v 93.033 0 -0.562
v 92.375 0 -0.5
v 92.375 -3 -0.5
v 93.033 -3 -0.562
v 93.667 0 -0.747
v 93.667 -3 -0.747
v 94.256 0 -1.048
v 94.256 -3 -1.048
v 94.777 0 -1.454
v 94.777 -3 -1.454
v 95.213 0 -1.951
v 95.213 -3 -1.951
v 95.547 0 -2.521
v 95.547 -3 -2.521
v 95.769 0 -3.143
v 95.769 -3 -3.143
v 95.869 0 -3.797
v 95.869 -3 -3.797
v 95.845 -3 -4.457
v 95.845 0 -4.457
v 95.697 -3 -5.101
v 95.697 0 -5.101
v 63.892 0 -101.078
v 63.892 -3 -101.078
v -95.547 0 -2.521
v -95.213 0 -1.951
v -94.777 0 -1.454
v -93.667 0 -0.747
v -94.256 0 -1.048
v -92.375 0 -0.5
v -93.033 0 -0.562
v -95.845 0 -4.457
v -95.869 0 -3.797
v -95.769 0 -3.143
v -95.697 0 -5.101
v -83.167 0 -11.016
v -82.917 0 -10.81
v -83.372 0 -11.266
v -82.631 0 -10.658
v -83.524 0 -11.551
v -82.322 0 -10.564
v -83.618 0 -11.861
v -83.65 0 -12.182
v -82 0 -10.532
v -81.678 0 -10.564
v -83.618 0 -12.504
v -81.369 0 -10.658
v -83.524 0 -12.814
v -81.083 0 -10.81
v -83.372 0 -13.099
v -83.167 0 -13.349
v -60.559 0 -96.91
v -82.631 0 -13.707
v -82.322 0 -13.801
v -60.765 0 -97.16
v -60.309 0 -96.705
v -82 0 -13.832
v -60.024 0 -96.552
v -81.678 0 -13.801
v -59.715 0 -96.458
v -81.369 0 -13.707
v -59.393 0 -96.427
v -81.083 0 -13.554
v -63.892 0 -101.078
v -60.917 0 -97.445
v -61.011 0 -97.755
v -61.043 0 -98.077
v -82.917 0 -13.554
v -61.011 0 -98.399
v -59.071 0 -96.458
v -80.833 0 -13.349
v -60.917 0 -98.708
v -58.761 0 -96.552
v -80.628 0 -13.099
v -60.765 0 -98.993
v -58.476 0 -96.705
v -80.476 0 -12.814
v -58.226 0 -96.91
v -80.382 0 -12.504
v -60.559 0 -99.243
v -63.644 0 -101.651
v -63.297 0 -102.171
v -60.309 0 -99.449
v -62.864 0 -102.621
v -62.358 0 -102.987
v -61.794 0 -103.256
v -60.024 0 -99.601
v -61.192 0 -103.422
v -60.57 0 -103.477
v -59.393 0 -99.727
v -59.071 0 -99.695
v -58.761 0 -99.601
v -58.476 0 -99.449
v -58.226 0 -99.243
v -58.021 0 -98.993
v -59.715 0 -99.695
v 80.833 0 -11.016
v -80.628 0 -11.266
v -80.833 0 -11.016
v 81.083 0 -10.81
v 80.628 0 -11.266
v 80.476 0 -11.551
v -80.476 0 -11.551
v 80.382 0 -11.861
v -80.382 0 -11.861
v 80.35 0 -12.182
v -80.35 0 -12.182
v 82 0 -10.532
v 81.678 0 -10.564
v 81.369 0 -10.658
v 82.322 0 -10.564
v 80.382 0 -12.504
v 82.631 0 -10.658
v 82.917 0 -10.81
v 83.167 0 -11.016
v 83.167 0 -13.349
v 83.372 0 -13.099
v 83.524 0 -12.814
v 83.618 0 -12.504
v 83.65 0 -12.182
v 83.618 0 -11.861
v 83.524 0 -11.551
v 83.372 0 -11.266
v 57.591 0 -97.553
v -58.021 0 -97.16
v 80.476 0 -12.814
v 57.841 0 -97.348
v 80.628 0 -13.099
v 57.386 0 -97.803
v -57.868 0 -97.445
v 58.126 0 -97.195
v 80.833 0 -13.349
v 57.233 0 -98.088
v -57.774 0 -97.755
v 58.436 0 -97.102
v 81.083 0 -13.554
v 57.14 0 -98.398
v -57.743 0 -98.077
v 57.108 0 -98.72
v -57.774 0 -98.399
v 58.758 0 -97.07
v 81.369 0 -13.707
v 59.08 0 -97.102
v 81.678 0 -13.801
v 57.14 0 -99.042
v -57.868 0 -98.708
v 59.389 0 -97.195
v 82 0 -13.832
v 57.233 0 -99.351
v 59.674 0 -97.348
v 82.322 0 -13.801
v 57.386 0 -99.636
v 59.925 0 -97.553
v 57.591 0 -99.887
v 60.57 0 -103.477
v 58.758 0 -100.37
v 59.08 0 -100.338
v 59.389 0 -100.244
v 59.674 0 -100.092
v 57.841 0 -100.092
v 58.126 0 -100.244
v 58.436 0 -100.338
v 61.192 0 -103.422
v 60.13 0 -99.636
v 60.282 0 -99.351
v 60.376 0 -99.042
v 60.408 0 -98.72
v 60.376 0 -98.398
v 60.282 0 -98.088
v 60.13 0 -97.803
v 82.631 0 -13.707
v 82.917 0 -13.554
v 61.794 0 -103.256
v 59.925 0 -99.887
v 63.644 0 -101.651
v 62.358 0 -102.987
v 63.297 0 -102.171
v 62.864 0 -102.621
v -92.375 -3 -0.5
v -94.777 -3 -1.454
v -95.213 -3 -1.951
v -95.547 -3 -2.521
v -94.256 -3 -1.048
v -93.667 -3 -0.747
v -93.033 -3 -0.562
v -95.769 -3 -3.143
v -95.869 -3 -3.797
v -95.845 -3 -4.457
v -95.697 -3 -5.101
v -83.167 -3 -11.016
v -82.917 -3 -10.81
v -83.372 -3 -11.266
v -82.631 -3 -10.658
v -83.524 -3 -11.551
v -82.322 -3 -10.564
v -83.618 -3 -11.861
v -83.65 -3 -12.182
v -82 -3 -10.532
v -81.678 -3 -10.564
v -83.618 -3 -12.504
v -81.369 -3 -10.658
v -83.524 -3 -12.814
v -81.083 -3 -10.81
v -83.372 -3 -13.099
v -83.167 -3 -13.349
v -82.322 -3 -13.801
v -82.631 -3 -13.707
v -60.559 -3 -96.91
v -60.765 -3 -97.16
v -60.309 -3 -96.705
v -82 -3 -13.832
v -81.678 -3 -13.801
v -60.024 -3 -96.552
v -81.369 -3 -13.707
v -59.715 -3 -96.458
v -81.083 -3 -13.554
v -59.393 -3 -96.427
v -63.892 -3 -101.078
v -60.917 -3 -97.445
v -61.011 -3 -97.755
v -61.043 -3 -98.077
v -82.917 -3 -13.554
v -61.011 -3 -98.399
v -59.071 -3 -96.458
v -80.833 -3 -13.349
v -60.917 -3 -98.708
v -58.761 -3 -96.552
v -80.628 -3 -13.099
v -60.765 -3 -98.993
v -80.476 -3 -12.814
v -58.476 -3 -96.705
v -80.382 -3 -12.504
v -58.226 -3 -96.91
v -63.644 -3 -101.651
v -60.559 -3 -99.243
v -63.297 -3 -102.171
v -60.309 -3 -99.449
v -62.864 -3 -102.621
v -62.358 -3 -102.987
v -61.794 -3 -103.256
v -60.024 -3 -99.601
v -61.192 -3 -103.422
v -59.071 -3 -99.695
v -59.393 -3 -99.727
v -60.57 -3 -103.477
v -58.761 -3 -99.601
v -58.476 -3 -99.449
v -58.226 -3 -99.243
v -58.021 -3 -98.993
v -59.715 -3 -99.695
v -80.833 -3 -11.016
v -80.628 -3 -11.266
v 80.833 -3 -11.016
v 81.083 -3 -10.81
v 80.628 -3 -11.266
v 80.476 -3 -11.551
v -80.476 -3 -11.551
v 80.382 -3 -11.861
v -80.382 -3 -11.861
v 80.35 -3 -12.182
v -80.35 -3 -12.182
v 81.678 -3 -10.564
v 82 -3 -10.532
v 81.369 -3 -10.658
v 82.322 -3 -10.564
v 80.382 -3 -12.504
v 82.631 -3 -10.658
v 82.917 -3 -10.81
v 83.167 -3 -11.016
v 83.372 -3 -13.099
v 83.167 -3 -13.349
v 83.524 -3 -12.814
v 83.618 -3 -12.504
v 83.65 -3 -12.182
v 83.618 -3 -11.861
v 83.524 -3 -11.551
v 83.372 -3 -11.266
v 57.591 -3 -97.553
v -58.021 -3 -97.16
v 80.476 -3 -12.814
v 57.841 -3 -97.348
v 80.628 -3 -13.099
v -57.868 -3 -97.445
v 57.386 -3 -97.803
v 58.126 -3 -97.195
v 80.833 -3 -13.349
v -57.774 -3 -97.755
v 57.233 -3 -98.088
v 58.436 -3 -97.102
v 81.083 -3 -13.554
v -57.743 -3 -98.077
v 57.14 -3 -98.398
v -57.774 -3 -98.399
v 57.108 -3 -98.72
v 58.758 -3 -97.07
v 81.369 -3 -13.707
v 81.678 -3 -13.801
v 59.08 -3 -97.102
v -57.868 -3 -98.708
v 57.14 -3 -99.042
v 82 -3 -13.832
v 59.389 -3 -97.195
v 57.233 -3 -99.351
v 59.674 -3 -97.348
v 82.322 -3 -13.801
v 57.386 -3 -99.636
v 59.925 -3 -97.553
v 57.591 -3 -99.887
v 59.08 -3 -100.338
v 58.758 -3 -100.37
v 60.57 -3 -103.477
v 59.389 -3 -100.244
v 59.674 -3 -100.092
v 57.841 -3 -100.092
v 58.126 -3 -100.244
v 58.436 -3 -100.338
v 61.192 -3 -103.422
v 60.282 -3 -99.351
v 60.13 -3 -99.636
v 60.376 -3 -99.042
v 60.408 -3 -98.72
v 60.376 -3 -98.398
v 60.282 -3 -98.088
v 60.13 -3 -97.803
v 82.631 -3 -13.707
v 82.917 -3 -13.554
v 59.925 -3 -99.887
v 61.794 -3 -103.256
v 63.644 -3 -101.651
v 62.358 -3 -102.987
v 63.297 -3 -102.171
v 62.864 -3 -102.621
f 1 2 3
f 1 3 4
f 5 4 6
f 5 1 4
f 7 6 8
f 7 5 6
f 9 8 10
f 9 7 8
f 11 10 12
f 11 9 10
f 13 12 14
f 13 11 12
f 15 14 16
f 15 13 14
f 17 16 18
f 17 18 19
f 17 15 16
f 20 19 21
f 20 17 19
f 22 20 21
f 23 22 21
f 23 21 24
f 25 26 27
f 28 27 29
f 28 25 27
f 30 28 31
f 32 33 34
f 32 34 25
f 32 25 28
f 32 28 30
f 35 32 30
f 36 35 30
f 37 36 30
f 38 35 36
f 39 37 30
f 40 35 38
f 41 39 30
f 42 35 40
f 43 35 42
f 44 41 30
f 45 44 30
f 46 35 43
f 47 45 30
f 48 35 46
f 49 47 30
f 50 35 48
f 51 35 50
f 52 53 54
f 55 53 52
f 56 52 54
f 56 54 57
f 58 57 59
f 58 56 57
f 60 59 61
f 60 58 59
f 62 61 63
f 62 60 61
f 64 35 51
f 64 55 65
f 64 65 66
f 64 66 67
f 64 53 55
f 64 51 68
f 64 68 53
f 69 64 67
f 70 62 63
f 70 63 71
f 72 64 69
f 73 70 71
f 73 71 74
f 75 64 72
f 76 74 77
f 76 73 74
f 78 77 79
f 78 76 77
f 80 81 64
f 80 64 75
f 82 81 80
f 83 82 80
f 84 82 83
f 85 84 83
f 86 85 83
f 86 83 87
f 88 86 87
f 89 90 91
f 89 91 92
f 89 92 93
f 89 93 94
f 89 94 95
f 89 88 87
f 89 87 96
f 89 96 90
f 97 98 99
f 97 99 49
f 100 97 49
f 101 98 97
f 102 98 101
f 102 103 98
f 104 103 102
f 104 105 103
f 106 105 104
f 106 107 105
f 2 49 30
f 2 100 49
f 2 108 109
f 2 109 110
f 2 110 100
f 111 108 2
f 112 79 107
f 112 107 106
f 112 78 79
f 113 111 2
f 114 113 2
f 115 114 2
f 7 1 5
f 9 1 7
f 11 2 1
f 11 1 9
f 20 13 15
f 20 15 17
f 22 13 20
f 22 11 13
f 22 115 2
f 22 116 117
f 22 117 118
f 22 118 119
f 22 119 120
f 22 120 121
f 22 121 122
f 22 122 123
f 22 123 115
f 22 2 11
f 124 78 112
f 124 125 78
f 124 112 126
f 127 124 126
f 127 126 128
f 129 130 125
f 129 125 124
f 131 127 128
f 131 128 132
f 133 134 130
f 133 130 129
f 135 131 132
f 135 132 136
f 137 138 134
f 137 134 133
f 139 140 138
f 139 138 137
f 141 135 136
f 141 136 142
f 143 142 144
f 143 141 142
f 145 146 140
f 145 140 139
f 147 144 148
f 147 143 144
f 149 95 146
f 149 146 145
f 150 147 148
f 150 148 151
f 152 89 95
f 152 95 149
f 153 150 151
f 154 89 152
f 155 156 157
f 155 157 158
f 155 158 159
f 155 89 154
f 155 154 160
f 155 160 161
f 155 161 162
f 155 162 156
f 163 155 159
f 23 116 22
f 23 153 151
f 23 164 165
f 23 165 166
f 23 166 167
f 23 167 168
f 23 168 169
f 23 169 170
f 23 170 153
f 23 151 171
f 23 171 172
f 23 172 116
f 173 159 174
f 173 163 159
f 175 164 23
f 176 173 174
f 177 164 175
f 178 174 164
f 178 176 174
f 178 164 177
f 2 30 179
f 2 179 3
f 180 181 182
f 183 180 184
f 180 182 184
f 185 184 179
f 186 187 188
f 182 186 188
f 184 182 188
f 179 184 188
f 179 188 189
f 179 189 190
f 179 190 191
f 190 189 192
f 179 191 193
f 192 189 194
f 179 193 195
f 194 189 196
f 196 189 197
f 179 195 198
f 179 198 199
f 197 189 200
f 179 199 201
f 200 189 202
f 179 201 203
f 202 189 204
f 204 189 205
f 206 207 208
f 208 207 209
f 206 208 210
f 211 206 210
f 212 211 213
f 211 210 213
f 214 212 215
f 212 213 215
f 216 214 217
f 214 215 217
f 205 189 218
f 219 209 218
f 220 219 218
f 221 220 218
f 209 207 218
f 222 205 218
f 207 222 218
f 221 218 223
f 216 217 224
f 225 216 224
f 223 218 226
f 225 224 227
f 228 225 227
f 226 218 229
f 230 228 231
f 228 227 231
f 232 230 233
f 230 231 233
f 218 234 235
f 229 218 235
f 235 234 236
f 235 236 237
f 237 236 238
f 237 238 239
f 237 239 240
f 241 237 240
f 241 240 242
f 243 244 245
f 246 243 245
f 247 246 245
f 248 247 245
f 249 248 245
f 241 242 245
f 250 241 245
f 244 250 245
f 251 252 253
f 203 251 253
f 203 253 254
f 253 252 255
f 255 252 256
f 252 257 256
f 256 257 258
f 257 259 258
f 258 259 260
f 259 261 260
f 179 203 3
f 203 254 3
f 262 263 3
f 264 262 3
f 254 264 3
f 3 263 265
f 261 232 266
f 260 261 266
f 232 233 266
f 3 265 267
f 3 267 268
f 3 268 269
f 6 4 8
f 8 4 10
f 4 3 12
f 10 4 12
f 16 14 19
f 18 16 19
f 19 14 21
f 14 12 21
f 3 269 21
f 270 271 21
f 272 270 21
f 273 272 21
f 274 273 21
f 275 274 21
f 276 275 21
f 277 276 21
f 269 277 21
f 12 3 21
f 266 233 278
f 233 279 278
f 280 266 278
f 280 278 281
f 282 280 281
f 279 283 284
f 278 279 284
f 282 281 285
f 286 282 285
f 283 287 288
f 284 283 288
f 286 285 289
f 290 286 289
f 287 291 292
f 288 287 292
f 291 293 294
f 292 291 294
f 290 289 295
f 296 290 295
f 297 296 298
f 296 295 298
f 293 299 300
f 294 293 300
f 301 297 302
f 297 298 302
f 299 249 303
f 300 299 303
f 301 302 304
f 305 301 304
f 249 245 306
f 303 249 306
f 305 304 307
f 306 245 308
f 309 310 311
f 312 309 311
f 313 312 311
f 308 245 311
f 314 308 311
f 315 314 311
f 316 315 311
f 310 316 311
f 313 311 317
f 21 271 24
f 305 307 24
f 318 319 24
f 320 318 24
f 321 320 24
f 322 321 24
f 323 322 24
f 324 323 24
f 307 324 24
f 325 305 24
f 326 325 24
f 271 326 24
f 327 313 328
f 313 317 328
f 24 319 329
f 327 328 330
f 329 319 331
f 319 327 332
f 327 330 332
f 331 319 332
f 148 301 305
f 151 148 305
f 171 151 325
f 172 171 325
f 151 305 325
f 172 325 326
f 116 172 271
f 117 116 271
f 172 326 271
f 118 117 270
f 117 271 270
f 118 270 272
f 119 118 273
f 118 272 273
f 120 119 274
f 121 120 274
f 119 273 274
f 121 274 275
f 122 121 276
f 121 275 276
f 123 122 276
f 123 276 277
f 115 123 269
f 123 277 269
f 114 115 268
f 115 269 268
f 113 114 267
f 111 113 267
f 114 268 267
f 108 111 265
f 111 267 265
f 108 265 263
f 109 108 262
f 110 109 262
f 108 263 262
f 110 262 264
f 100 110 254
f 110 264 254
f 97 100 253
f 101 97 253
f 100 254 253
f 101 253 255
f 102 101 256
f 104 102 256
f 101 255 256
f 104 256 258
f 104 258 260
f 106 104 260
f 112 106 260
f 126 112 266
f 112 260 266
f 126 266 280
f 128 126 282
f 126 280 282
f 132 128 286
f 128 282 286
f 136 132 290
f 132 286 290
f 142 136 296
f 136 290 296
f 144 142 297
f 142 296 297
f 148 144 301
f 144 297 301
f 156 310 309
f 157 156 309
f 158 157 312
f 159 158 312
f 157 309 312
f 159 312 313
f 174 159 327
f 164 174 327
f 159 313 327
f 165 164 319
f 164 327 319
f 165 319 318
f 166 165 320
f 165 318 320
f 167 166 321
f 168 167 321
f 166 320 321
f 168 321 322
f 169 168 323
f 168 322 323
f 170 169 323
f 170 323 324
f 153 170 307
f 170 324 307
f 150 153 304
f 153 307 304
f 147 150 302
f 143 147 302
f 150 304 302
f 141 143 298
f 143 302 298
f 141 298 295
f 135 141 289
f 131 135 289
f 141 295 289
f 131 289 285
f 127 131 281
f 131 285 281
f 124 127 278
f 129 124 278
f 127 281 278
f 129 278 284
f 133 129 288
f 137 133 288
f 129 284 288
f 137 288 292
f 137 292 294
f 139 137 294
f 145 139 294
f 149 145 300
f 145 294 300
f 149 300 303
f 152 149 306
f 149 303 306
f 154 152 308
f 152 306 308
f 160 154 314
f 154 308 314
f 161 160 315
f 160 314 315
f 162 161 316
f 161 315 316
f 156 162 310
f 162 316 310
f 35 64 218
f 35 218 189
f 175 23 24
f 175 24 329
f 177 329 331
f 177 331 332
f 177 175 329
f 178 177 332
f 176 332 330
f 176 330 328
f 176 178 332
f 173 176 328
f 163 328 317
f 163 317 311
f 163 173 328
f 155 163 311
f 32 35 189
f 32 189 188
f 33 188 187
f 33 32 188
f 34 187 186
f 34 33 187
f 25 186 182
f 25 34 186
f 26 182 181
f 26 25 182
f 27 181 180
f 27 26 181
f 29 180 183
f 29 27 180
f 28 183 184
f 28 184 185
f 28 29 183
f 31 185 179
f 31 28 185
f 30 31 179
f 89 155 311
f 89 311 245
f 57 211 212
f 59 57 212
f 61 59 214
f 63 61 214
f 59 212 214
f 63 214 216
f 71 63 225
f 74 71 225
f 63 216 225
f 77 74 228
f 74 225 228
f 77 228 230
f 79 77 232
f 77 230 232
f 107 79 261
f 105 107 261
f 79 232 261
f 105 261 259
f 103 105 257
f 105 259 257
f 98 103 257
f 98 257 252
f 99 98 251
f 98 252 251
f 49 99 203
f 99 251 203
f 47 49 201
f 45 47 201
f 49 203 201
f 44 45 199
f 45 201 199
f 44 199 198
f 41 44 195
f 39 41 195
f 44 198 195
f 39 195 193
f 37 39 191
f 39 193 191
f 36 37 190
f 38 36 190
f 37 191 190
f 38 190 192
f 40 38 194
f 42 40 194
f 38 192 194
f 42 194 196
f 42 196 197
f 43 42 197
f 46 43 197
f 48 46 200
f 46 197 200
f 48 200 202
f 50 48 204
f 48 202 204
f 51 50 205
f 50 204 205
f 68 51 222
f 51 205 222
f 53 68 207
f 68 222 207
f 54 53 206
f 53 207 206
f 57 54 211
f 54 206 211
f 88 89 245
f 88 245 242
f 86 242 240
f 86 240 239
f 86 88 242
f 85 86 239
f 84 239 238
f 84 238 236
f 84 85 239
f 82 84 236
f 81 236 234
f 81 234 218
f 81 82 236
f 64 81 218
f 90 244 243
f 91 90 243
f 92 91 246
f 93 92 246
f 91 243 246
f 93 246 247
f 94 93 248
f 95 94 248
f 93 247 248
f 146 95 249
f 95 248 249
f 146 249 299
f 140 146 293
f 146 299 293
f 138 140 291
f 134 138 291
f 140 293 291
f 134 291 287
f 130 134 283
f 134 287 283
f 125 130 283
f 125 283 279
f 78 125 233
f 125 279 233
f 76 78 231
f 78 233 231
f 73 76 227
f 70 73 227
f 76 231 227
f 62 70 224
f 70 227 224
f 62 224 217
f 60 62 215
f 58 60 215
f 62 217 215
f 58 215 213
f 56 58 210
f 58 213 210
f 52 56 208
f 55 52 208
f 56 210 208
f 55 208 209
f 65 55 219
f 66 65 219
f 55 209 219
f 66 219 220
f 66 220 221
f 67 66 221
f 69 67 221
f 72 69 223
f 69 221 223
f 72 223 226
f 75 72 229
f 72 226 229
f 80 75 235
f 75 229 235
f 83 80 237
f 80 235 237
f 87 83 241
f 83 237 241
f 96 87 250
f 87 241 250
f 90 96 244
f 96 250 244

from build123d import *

# Parameters (mm, degrees)
BASE_FLANGE1_DEPTH = 3
SKETCH23_R         = 1.65
CUT_EXTRUDE3_DEPTH = 3


# Sheet-metal steps are written as plain solids
with BuildPart() as part:
    # Sketch1 → Base-Flange1 (new body)
    with BuildSketch(Plane(origin=(0, 0, 0), x_dir=(1, 0, 0), z_dir=(0, 1, 0))):
        with BuildLine():
            Line((-63.892333426, 101.078420902), (-95.697333426, 5.100954406))
            ThreePointArc((-95.697333426, 5.100954406), (-95.212546513, 1.951017377), (-92.375, 0.5))
            Line((-92.375, 0.5), (92.375, 0.5))
            ThreePointArc((92.375, 0.5), (95.212546513, 1.951017377), (95.697333426, 5.100954406))
            Line((95.697333426, 5.100954406), (63.892333426, 101.078420902))
            ThreePointArc((63.892333426, 101.078420902), (62.618982623, 102.815013009), (60.57, 103.477466496))
            Line((60.57, 103.477466496), (-60.57, 103.477466496))
            ThreePointArc((-60.57, 103.477466496), (-62.618982623, 102.815013009), (-63.892333426, 101.078420902))
        make_face()
    extrude(amount=-BASE_FLANGE1_DEPTH)

    # Sketch23 → Cut-Extrude3 (cut)
    with BuildSketch(Plane.XZ.offset(3)):
        with Locations(Location((-82, -12.182416465, 0), (0, 0, 270))):
            Circle(SKETCH23_R)
        with Locations(Location((82, -12.182416465, 0), (0, 0, 270))):
            Circle(SKETCH23_R)
        with Locations(Location((58.757797989, -98.719801772, 0), (0, 0, 270))):
            Circle(SKETCH23_R)
        with Locations(Location((-59.392713729, -98.076633575, 0), (0, 0, 270))):
            Circle(SKETCH23_R)
    extrude(amount=-CUT_EXTRUDE3_DEPTH, mode=Mode.SUBTRACT)


solid = part.part
